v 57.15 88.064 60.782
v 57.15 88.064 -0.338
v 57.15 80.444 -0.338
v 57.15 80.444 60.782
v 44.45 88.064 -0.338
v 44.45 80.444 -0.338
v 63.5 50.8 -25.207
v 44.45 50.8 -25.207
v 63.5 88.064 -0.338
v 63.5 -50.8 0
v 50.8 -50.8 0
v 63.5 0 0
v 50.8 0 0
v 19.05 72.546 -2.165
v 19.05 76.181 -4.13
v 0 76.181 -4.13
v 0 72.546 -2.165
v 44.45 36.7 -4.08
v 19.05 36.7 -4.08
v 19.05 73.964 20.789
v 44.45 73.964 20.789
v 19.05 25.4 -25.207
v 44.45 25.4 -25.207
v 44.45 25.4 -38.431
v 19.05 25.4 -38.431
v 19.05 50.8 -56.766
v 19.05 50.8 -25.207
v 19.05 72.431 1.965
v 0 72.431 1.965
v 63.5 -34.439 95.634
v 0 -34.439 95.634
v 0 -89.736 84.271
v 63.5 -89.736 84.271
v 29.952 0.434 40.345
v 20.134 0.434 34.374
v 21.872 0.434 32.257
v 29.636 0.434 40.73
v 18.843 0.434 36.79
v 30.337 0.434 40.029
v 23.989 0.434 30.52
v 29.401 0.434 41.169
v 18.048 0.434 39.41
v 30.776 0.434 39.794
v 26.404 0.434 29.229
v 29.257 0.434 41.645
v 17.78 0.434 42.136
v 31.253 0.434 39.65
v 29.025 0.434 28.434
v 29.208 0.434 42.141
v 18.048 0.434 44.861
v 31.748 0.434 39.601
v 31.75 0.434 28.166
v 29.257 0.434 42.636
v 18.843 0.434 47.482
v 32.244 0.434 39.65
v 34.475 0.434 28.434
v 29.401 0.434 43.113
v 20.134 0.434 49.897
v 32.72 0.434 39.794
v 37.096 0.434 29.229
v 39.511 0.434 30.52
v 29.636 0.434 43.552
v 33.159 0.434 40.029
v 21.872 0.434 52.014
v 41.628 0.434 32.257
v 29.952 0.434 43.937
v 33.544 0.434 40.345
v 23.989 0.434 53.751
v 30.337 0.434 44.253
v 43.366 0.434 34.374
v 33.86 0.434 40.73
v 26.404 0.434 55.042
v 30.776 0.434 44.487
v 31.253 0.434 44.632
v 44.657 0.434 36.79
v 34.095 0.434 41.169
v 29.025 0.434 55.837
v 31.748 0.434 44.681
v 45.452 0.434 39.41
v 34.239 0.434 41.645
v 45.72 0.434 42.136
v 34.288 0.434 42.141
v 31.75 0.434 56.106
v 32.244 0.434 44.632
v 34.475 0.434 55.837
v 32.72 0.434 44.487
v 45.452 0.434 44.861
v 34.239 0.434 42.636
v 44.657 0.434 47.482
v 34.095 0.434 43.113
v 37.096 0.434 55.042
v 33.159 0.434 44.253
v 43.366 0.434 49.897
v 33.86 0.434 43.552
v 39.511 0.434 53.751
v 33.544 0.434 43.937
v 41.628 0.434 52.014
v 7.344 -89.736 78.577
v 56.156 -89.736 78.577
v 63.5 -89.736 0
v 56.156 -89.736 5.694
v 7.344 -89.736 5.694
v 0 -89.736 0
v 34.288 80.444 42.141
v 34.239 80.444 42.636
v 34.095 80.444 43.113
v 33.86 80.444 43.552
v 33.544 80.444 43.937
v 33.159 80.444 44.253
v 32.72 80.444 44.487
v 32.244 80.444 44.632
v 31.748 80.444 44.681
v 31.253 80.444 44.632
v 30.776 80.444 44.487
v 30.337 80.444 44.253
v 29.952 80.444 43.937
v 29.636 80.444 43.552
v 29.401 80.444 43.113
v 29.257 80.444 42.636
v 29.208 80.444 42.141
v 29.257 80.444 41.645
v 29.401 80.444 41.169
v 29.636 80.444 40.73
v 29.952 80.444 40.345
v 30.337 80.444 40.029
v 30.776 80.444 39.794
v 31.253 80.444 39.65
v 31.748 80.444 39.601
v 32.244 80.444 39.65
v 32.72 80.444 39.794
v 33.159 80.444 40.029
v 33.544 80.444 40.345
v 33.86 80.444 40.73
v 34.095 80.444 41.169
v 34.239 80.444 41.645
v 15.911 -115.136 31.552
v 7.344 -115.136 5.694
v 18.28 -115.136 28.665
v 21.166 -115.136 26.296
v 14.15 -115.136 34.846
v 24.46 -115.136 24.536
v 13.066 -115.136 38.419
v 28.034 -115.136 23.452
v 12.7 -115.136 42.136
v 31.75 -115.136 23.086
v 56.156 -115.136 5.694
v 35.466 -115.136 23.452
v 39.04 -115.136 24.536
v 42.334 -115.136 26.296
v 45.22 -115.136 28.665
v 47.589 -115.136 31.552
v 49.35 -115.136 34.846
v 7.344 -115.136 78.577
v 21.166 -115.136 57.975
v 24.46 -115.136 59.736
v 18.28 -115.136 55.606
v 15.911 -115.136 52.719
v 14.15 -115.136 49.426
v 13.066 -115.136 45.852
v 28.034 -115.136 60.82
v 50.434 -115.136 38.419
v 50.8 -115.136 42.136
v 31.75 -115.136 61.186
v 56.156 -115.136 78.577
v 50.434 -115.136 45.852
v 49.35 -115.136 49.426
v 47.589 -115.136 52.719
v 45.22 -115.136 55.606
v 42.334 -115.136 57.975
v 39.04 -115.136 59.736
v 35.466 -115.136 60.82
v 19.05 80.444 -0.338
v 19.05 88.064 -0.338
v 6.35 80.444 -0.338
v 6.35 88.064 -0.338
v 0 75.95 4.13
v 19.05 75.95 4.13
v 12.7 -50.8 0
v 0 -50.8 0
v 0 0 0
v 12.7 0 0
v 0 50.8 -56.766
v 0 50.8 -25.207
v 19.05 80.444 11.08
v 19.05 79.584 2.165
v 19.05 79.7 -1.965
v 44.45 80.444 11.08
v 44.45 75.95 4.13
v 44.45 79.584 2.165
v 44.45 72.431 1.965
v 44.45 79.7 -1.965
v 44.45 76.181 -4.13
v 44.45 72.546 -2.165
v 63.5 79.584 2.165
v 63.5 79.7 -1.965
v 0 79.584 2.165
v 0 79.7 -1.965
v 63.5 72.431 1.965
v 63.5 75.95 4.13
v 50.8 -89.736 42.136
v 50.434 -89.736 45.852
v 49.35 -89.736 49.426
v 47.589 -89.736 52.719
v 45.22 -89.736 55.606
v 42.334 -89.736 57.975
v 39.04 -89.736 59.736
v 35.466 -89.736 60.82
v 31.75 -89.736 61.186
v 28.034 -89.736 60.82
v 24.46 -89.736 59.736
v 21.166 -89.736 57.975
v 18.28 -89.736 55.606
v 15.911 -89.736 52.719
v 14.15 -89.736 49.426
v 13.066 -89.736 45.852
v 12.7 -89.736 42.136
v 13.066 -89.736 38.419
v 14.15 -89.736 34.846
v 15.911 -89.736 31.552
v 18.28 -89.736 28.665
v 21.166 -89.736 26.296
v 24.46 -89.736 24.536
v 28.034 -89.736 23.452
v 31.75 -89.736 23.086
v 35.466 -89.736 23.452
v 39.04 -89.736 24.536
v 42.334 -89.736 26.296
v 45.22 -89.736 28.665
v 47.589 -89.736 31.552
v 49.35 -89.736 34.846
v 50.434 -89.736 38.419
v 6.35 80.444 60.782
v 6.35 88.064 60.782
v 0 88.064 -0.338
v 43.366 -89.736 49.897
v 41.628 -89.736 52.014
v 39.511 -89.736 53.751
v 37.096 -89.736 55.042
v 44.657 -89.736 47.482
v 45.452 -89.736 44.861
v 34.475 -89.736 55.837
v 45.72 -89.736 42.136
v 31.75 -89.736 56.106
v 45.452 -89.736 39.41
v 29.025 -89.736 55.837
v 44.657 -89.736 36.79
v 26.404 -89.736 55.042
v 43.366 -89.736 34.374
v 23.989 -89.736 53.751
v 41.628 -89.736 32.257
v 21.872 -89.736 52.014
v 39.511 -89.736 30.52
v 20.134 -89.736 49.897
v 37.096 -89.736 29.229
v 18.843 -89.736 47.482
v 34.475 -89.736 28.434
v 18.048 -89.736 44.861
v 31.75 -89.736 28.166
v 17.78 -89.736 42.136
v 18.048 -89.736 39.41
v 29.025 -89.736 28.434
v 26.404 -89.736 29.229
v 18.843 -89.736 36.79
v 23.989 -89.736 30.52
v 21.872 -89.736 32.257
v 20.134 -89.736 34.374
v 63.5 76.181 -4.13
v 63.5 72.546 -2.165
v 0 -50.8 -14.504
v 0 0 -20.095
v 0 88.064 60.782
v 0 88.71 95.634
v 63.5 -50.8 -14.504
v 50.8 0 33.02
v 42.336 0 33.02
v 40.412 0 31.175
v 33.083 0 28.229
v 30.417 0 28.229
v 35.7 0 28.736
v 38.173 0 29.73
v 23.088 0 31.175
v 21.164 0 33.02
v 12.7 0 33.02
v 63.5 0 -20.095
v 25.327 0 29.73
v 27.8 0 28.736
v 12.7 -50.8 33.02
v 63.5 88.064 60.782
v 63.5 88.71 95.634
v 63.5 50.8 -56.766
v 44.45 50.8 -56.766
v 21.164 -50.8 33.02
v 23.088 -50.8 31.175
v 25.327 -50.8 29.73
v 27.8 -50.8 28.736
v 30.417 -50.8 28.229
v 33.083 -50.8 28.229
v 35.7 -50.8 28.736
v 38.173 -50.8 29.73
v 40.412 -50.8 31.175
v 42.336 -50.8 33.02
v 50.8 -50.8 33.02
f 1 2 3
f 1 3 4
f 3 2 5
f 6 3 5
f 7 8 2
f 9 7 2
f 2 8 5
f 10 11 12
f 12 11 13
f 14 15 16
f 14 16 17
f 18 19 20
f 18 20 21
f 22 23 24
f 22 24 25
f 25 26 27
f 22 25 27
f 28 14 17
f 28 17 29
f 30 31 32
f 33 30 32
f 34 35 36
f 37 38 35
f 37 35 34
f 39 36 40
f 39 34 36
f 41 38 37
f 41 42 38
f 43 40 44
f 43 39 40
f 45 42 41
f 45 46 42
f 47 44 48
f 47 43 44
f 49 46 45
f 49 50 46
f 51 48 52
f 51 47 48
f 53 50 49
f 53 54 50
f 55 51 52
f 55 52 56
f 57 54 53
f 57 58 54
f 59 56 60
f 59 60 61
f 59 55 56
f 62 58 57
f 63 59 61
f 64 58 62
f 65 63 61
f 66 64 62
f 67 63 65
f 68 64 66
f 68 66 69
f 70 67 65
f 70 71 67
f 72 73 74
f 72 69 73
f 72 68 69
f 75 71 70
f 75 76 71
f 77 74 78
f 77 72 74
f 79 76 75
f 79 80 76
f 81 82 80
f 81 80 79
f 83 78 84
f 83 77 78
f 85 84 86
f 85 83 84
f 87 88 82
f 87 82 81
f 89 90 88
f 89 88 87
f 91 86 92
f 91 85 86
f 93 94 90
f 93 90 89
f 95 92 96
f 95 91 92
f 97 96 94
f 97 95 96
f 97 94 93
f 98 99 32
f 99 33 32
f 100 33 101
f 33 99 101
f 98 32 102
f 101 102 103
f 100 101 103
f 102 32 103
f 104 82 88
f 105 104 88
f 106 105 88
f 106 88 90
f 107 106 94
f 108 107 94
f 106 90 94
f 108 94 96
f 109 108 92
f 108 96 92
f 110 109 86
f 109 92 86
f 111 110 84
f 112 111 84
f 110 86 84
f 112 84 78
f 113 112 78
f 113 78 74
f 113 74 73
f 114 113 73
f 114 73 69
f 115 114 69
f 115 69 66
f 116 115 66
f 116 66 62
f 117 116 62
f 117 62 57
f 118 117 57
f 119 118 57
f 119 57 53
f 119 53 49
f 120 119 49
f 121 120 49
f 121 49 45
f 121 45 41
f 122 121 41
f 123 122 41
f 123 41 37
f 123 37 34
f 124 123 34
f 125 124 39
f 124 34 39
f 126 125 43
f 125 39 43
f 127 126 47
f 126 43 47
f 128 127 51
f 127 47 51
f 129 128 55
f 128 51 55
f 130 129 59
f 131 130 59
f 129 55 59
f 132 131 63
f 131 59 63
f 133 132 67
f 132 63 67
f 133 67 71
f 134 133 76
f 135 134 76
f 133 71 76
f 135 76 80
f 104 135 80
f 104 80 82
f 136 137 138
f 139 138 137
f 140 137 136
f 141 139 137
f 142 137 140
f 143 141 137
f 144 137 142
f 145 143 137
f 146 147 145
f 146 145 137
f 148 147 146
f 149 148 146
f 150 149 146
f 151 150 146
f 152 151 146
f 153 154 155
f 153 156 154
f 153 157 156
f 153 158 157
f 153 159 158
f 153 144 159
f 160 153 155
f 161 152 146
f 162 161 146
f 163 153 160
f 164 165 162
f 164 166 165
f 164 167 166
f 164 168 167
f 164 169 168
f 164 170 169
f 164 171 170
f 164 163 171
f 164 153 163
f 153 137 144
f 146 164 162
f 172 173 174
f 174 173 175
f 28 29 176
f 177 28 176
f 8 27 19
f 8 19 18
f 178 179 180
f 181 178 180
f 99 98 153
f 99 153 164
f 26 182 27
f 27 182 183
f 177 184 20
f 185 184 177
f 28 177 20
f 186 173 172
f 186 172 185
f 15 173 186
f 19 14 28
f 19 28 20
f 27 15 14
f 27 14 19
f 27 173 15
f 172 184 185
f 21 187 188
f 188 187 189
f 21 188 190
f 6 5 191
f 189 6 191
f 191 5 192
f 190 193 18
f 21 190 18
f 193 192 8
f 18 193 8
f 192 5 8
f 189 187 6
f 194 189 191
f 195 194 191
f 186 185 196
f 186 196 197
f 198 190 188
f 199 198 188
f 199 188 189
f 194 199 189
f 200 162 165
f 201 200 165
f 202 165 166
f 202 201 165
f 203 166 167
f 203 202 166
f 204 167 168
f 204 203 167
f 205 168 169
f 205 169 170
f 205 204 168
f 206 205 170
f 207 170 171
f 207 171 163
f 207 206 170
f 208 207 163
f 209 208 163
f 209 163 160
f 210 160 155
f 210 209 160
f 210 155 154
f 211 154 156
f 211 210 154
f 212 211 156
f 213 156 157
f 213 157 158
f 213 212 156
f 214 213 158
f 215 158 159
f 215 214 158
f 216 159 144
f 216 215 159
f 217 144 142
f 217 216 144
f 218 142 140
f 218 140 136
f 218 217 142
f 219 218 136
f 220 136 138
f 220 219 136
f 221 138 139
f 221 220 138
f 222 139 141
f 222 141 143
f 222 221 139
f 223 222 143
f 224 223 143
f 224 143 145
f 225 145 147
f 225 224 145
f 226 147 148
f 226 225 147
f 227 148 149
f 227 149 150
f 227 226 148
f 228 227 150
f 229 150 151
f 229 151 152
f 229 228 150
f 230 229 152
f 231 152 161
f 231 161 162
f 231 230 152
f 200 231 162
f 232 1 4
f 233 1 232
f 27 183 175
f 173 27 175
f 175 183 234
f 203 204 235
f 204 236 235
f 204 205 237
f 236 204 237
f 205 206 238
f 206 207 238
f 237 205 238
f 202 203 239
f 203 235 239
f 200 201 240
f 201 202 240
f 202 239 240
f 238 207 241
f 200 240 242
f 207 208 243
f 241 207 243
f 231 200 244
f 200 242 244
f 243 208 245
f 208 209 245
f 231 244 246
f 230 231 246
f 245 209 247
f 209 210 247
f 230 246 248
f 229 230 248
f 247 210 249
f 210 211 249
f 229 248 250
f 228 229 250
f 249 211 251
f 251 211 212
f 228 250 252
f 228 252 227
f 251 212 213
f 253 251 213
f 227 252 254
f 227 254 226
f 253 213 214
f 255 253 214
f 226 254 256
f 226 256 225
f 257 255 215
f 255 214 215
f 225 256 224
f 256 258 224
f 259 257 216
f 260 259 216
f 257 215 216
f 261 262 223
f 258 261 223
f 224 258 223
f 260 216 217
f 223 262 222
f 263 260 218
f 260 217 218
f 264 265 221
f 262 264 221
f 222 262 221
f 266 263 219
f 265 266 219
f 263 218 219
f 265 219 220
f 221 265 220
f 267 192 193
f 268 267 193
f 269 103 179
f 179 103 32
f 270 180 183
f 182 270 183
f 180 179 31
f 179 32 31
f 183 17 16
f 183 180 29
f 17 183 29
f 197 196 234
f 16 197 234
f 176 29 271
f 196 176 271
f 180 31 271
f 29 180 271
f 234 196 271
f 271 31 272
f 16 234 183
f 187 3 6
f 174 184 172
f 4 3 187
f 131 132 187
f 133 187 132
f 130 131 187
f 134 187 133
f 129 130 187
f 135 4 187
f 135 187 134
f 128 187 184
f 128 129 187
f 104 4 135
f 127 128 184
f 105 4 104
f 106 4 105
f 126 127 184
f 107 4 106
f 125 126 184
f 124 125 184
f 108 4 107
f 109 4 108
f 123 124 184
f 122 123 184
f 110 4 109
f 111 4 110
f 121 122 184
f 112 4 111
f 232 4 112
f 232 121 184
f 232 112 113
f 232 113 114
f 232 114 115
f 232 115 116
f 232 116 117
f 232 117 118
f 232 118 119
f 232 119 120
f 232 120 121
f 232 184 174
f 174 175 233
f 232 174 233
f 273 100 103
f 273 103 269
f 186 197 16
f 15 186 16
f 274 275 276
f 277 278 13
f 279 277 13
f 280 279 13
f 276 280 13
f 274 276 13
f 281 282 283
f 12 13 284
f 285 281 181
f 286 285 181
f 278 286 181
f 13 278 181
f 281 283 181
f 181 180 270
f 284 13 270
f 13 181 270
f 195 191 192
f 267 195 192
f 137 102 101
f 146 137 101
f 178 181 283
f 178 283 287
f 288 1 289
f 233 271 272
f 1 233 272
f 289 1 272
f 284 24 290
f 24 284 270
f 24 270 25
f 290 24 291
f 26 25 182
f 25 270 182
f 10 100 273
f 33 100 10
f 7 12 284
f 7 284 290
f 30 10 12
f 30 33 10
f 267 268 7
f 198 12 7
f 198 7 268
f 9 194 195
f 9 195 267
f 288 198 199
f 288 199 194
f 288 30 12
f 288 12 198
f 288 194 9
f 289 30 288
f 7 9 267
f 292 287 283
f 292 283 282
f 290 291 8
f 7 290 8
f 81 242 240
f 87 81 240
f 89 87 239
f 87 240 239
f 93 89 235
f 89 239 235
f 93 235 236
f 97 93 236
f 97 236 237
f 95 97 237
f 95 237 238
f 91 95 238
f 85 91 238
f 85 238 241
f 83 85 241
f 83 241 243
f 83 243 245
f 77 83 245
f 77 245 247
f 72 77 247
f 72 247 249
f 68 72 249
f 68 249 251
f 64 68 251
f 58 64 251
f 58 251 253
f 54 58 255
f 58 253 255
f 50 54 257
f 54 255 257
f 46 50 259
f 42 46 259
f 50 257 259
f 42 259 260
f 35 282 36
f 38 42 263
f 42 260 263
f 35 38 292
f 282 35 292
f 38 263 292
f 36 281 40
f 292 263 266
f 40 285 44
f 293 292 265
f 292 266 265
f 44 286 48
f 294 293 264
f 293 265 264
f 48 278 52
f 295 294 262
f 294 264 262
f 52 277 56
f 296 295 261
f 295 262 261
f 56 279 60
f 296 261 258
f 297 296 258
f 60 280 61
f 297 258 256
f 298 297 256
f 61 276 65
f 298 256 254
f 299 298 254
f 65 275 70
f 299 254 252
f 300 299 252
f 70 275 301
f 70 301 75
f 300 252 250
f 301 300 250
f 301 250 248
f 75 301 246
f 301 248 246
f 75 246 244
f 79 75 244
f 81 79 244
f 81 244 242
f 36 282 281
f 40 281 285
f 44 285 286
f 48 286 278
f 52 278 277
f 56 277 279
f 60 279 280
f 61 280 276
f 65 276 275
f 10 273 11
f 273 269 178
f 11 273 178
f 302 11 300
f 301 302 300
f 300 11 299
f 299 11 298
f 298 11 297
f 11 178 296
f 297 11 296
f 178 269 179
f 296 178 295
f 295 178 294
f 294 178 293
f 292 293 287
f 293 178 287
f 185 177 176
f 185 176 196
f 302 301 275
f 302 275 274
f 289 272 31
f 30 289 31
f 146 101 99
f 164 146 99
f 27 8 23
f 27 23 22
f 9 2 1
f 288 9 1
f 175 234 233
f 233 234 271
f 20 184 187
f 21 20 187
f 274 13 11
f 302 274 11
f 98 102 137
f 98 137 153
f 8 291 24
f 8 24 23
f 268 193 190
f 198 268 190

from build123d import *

# Parameters (mm, degrees)
F1_DEPTH  = 63.5
F2_W      = 25.4
F2_H      = 44.800144308
F3_DEPTH  = 25.4
F4_W      = 25.4
F4_H      = 31.5590774218
F5_DEPTH  = 25.4
F6_W      = 48.812078476
F6_H      = 72.883464396
F6_R      = 19.05
F7_DEPTH  = 25.4
F6_R_2    = 13.97
F8_DEPTH  = 90.17
F9_W      = 38.1
F9_H      = 50.8
F10_DEPTH = 33.02
F11_W     = 50.8
F11_H     = 61.1203222922
F12_DEPTH = 7.62
F13_R     = 2.54
F14_DEPTH = 584.2


with BuildPart() as f1:
    # F0 (on Right) → F1 (new body)
    with BuildSketch(Plane.YZ):
        Polygon((88.0636948228, -0.3382474043), (88.0636948228, 60.7820748879), (88.7095872307, 95.6336185336), (-34.4394557178, 95.6336185336), (-89.7363051772, 84.2712447047), (-89.7363051772, 0), (-50.8, -14.504159911), (-50.8, 0), (0, 0), (0, -20.0953550052), (50.8, -56.7663814664), (50.8, -25.2073040446), align=None)
        Polygon((72.5463054062, -2.1647087139), (72.4311518908, 1.9652569746), (75.9502303361, 4.1299656885), (79.5844622969, 2.1647087139), (79.6996158123, -1.9652569746), (76.1805373669, -4.1299656885), align=None, mode=Mode.SUBTRACT)
    extrude(amount=F1_DEPTH)

    # F2 (on face) → F3 (cut)
    with BuildSketch(Plane(origin=(0, 27.2928575232, -40.895508354), x_dir=(1, 0, 0), z_dir=(0, 0.5551110833, -0.831776223))):
        with Locations((31.75, -50.6614504268)):
            Rectangle(F2_W, F2_H)
    extrude(amount=-F3_DEPTH, mode=Mode.SUBTRACT)

    # F4 (on face) → F5 (cut)
    with BuildSketch(Plane(origin=(0, 50.8, 0), x_dir=(-1, 0, 0), z_dir=(0, 1, 0))):
        with Locations((-31.75, -40.9868427555)):
            Rectangle(F4_W, F4_H)
    extrude(amount=-F5_DEPTH, mode=Mode.SUBTRACT)

    # F6 (on face) → F7 (join)
    with BuildSketch(Plane.XZ.offset(89.7363051772)):
        with Locations((31.75, 42.1356223524)):
            Rectangle(F6_W, F6_H)
        with Locations((31.75, 42.1356223524)):
            Circle(F6_R, mode=Mode.SUBTRACT)
    extrude(amount=F7_DEPTH)

    # F6 (on face) → F8 (cut)
    with BuildSketch(Plane.XZ.offset(89.7363051772)):
        with Locations((31.75, 42.1356223524)):
            Circle(F6_R_2)
    extrude(amount=-F8_DEPTH, mode=Mode.SUBTRACT)

    # F9 (on face) → F10 (cut)
    with BuildSketch(Plane(origin=(0, 0, 0), x_dir=(1, 0, 0), z_dir=(0, 0, -1))):
        with Locations((31.75, 25.4)):
            Rectangle(F9_W, F9_H)
    extrude(amount=-F10_DEPTH, mode=Mode.SUBTRACT)

    # F11 (on face) → F12 (cut)
    with BuildSketch(Plane(origin=(0, 88.0636948228, 0), x_dir=(-1, 0, 0), z_dir=(0, 1, 0))):
        with Locations((-31.75, 30.2219137418)):
            Rectangle(F11_W, F11_H)
    extrude(amount=-F12_DEPTH, mode=Mode.SUBTRACT)

    # F13 (on face) → F14 (cut)
    with BuildSketch(Plane.XZ.offset(89.7363051772)):
        with Locations((31.7480713129, 42.1407744288)):
            Circle(F13_R)
    extrude(amount=-F14_DEPTH, mode=Mode.SUBTRACT)


solid = f1.part
